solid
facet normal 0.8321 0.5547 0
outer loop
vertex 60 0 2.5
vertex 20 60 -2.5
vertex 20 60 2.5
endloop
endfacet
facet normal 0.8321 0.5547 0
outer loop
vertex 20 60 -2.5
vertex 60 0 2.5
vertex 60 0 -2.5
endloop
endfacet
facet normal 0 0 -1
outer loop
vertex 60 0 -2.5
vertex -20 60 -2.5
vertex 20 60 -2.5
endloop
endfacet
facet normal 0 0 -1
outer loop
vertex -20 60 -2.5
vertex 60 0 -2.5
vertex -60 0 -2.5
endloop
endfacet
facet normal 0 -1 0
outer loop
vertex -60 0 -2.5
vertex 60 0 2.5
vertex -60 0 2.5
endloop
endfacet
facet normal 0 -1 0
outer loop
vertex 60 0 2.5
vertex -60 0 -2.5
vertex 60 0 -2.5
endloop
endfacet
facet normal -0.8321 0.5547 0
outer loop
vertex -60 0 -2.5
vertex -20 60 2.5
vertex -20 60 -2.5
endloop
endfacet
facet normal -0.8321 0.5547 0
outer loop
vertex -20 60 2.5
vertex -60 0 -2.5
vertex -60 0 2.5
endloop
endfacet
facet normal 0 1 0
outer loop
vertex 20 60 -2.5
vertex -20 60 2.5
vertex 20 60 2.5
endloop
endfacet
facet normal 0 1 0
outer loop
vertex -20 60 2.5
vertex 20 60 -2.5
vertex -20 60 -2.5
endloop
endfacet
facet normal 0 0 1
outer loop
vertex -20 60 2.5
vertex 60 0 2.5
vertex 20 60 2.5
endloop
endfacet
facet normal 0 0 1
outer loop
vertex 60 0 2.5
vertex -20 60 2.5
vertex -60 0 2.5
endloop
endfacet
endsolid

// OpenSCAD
// 

// --- iCrate Mount: Flat Planar Hanger ---
// Orientation:
// X = Horizontal (along the wire)
// Z = Vertical (Up/Down)
// Y = Thickness (into/out of plane)

// --- Dimensions ---
wire_diameter = 4;
wire_spacing_edge_to_edge = 105;
wire_center_spacing = wire_spacing_edge_to_edge + wire_diameter;

thickness = 5;
spread = 120; // Distance between hooks
height = 60; // How far it hangs down (along Z)
bottom_width = 40; // Width of the bottom edge

$fn = 60;

// !!! DO NOT TOUCH THE MOCK BELOW. KEEP OBSERVING IT. !!!
// !!! THE MOCK IS STATIC IN THE XZ PLANE. !!!
// !!! DO NOT CHANGE THESE CYLINDERS. !!!
module cage_mock() {
  %union() {
    cage_wire();
  }
}

module camera_sim(total_h = 103, dia = 117) {

  // Calculate cylinder length
  cyl_h = total_h - (dia / 2);

  // Rotate so it hangs down like a ceiling mount (Dome at bottom)
  rotate([180, 0, 0])
    intersection() {
      union() {
        // 1. The Cylinder Body
        cylinder(d=dia, h=cyl_h);

        // 2. The Dome (Centered at 0, sticking down)
        sphere(d=dia);
      }

      // 3. The "Chopper" 
      // A big box that allows the bottom dome to exist 
      // but cuts off anything sticking out the back (top).
      // It goes from -Radius (bottom of dome) to Cylinder Height.
      translate([0, 0, -dia])
        cylinder(d=dia, h=dia + cyl_h);
    }
}

// !!! DO NOT TOUCH THE WIRE BELOW. KEEP OBSERVING IT. !!!
// !!! THE WIRE IS STATIC IN THE XZ PLANE. !!!
// !!! DO NOT CHANGE THESE CYLINDERS. !!!
module cage_wire() {
  // Top Wire (Along X, at Z=0)
  translate([0, wire_diameter / 2, 0])
    color("gray")
      rotate([0, 90, 0])
        cylinder(d=wire_diameter, h=250, center=true);

  // Bottom Wire (Along X, at Z=-109)
  translate([0, wire_diameter / 2, -wire_center_spacing])
    rotate([0, 90, 0])
      color("gray")
        cylinder(d=wire_diameter, h=250, center=true);
}

module trapezoid_profile(w_top, w_bottom, h) {
  polygon(
    points=[
      [-w_bottom / 2, h],
      [w_bottom / 2, h],
      [w_top / 2, 0],
      [-w_top / 2, 0],
    ]
  );
}

module icrate_mount() {
  // ONLY THE MOUNT IS ROTATED TO ALIGN WITH THE XZ PLANE
  difference() {
    rotate([0, 0, 0])
      linear_extrude(thickness, center=true) {
        trapezoid_profile(spread, bottom_width, height);
      }

    // Cut out an wire extruded down 8mm
    translate([0, 0, 0])
      linear_extrude(8, center=true) {
        cage_wire();
      }
  }
}

// --- Render ---
// The mock is called directly without global rotation.
cage_mock();

// The mount contains its own internal rotation to match the XZ plane.
color("orange") icrate_mount();
